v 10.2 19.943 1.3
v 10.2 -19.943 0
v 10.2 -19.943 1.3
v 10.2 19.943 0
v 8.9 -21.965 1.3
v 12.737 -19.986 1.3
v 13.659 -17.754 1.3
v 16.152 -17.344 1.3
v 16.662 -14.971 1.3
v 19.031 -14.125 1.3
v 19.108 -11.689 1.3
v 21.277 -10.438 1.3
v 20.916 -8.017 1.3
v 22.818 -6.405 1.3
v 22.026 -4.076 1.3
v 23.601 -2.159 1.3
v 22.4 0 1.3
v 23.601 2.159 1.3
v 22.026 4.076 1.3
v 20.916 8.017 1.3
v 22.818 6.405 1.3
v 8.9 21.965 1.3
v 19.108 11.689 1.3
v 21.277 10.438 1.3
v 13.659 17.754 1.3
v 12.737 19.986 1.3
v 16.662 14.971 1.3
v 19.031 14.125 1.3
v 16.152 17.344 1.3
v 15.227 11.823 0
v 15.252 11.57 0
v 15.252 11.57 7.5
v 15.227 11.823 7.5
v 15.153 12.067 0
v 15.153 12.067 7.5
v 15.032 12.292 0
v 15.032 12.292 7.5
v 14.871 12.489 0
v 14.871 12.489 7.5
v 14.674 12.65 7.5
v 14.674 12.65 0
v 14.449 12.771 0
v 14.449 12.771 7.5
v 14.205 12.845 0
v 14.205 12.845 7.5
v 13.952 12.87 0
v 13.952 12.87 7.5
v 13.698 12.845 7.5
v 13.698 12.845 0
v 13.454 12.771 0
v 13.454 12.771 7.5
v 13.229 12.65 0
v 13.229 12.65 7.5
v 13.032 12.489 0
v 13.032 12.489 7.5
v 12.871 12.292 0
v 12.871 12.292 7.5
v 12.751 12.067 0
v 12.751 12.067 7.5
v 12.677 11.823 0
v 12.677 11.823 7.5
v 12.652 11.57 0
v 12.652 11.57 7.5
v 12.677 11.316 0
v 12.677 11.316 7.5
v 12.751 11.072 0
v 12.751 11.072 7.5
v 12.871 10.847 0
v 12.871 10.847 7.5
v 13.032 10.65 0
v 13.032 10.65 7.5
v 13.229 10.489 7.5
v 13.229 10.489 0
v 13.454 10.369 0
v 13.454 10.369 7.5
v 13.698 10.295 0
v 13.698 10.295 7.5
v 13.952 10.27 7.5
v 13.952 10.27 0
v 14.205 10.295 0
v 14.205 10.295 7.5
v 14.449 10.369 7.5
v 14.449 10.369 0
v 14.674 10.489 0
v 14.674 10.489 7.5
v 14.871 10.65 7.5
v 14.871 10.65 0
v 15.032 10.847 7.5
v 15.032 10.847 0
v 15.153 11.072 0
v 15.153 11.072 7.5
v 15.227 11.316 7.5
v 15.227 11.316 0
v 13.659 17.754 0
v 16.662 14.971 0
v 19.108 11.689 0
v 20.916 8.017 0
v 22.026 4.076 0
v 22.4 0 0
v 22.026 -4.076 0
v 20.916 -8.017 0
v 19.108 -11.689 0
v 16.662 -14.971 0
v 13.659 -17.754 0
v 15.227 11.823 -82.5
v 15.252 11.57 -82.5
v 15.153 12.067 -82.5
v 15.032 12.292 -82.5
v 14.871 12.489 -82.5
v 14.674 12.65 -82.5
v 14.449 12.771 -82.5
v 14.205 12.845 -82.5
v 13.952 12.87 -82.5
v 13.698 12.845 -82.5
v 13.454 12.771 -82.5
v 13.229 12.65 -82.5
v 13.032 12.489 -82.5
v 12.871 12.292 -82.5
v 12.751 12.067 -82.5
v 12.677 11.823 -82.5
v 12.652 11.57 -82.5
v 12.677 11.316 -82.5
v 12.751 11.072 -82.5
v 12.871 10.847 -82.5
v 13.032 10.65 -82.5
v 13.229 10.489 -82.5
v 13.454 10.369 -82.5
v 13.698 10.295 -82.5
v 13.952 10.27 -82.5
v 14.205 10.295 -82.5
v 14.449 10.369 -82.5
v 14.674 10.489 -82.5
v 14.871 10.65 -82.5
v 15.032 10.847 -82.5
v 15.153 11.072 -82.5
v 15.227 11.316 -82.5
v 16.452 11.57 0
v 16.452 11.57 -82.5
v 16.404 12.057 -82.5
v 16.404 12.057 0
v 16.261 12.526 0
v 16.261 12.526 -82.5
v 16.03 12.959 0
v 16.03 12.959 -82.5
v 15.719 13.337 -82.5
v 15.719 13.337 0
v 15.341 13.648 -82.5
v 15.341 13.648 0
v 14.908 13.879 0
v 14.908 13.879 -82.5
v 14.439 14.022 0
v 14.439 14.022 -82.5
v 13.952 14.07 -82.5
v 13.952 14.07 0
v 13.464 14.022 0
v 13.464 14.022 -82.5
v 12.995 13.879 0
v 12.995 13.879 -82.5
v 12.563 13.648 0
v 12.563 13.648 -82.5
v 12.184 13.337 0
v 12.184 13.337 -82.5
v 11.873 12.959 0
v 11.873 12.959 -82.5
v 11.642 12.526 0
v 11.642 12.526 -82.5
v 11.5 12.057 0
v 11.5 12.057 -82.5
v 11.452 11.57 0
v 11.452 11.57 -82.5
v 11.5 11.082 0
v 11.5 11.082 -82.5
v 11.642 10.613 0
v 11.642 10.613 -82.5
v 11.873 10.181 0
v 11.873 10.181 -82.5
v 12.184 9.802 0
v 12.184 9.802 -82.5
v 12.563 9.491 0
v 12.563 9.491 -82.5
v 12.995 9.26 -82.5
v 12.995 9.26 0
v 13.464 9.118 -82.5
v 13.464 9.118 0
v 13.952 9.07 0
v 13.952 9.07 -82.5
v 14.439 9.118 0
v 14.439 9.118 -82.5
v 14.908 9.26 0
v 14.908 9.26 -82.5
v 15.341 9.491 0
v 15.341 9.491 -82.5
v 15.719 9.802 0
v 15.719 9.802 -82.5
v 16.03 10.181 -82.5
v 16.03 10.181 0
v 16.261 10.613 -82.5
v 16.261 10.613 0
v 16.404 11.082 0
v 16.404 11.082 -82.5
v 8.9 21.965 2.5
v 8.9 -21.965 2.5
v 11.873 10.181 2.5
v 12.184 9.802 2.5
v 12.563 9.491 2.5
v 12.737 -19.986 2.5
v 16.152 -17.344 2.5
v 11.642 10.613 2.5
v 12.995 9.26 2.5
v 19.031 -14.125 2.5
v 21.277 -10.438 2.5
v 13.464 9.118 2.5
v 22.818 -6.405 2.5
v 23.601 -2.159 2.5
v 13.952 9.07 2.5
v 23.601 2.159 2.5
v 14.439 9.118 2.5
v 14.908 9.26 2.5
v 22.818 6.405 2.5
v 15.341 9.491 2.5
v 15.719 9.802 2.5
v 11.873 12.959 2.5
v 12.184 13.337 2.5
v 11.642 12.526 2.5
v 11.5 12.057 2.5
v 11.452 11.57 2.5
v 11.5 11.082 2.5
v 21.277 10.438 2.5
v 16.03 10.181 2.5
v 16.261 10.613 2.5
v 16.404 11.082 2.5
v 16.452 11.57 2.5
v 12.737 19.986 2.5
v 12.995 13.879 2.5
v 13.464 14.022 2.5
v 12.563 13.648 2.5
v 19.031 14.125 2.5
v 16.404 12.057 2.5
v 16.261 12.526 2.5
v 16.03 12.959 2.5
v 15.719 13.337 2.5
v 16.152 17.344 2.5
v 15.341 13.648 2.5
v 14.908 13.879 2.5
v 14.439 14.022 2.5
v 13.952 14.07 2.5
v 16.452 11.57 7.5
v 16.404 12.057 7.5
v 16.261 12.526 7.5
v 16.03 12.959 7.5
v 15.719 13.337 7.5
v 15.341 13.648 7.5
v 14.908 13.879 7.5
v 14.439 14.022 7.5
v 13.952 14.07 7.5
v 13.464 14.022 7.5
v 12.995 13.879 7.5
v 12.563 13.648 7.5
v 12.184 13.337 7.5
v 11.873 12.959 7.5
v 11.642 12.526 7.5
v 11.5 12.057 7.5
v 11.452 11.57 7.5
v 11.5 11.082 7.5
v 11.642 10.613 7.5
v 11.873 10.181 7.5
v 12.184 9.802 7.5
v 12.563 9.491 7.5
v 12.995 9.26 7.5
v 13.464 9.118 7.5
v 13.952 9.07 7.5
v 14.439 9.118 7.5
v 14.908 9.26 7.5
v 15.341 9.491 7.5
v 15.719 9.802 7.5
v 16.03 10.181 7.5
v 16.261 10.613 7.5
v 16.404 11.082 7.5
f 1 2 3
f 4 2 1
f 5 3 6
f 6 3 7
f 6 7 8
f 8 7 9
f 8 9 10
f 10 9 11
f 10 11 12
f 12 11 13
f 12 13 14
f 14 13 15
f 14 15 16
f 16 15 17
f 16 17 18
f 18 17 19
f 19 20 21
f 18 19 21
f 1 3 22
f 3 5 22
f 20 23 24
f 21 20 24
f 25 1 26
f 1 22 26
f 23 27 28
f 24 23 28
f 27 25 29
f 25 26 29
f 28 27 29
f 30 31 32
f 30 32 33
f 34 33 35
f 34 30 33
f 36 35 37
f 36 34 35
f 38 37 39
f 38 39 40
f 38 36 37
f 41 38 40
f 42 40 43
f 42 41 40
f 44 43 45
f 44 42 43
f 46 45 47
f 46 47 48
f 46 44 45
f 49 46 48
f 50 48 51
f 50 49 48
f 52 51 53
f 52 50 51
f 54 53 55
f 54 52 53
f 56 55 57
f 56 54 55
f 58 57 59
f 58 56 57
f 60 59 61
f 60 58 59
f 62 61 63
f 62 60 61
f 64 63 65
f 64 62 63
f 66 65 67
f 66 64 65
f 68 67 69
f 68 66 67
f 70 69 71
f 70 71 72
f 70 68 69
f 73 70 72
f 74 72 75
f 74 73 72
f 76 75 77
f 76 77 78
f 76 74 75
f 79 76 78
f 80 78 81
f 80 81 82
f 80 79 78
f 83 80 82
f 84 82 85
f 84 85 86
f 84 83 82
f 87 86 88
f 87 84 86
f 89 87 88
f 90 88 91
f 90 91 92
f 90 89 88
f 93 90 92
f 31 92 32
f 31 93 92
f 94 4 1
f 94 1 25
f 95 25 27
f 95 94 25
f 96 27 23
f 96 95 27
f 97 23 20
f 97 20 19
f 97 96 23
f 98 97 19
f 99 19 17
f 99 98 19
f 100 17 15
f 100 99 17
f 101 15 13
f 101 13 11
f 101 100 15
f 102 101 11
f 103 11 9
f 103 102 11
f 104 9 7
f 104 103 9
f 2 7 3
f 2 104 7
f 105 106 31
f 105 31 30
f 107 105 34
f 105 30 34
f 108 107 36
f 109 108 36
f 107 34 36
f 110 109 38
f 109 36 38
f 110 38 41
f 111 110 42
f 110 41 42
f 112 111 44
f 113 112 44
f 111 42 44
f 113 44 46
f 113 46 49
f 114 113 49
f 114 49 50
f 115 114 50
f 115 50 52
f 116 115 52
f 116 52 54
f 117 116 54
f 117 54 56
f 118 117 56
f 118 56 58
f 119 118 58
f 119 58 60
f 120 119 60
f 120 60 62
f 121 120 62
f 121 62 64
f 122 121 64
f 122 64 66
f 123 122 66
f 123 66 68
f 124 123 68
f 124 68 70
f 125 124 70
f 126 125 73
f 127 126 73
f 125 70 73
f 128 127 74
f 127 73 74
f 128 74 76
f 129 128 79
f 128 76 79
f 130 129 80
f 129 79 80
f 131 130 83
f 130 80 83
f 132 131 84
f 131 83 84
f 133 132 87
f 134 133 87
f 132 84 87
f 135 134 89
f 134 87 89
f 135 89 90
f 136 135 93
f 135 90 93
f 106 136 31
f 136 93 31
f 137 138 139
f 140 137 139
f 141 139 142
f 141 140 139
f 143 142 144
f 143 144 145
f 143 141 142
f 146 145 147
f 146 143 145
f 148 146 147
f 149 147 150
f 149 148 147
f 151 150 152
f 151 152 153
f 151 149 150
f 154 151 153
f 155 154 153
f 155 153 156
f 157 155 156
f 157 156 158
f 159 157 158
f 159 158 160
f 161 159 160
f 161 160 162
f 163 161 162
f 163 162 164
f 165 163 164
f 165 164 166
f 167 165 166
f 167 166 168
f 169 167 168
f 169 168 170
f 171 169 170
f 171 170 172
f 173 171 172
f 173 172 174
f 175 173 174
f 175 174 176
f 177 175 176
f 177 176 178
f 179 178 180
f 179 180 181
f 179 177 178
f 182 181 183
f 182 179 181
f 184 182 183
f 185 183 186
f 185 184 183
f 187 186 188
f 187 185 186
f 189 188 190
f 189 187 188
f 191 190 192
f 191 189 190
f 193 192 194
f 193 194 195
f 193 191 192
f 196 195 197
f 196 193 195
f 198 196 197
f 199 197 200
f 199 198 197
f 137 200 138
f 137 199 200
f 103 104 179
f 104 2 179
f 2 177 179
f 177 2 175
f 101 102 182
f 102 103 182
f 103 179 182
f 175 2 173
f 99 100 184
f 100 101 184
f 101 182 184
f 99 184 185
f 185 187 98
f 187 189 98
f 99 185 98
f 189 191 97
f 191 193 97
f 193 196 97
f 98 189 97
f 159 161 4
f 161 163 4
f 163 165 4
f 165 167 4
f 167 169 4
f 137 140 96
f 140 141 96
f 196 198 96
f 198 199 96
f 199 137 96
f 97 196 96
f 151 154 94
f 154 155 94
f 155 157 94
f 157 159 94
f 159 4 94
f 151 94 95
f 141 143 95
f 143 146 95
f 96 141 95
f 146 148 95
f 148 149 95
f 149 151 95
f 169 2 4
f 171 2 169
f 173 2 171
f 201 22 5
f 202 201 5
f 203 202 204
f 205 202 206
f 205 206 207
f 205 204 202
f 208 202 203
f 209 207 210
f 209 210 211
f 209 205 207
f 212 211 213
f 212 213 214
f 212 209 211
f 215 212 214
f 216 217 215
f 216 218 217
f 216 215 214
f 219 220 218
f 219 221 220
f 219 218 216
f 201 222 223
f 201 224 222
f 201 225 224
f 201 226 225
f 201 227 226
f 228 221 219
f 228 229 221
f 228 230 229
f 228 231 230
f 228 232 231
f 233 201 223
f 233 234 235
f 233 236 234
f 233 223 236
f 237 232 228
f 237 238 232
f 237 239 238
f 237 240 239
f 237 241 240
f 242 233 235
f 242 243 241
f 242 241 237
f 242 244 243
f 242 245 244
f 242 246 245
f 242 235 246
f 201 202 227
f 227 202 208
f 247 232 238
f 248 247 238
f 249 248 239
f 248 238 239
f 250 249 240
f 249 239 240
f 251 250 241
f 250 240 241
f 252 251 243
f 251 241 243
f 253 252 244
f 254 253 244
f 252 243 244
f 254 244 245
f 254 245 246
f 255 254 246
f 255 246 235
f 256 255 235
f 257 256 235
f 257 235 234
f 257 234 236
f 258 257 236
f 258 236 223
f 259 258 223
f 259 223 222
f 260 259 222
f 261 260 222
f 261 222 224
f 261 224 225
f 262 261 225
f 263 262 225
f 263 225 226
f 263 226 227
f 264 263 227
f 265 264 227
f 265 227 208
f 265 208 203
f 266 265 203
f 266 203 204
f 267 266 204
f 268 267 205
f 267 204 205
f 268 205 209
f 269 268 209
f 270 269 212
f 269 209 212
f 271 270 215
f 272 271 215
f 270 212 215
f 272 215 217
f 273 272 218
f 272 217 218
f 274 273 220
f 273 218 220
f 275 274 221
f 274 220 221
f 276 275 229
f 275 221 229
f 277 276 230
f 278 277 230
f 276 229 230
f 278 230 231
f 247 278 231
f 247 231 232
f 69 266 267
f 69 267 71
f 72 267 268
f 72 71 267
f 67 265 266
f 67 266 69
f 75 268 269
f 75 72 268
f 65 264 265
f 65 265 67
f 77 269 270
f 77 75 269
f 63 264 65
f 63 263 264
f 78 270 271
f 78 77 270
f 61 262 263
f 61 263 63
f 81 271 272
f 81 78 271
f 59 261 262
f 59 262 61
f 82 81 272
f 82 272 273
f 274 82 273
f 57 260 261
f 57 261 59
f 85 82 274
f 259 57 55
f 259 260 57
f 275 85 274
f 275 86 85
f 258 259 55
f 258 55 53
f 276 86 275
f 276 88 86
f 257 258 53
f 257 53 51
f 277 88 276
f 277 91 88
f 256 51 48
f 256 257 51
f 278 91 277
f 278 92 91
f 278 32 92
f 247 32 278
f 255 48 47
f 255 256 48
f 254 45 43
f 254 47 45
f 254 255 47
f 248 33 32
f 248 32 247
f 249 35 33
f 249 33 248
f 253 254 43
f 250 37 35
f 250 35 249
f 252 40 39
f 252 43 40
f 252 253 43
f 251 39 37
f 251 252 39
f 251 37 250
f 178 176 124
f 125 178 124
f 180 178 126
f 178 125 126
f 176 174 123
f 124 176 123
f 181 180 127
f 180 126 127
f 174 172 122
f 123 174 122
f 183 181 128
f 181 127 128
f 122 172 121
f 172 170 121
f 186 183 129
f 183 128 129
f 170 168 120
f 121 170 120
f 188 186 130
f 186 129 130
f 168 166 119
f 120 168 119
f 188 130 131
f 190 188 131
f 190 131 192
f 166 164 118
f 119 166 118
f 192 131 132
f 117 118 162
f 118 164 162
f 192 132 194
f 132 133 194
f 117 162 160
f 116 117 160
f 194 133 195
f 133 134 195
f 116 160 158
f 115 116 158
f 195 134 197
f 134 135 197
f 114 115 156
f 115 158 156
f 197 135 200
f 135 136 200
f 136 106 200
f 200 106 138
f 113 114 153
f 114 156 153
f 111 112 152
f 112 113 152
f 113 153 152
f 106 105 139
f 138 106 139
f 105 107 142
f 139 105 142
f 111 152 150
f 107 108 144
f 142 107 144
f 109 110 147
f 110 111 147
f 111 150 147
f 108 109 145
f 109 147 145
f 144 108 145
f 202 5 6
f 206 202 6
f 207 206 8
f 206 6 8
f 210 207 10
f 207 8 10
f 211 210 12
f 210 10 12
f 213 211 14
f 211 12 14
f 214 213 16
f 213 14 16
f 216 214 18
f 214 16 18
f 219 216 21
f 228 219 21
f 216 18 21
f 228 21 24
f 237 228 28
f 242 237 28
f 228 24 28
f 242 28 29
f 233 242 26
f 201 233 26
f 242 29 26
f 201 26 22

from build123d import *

# Parameters (mm, degrees)
F0_R     = 2.5
F1_DEPTH = 2.5
F0_R_2   = 1.3
F2_DEPTH = 7.5
F3_DEPTH = 90
F4_DEPTH = 1.3


with BuildPart() as f1:
    # F0 (on Top) → F1 (new body)
    with BuildSketch(Plane.XY):
        with BuildLine():
            Line((8.9, 21.9654273803), (8.9, -21.9654273803))
            ThreePointArc((8.9, -21.9654273803), (23.7, 0), (8.9, 21.9654273803))
        make_face()
        with BuildLine():
            ThreePointArc((10.2, 19.9429185427), (22.4, 0), (10.2, -19.9429185427))
            Line((10.2, -19.9429185427), (10.2, 19.9429185427))
        make_face(mode=Mode.SUBTRACT)
        with BuildLine():
            Line((10.2, 19.9429185427), (10.2, -19.9429185427))
            ThreePointArc((10.2, -19.9429185427), (22.4, 0), (10.2, 19.9429185427))
        make_face()
        with Locations((13.9515874907, 11.5695847198)):
            Circle(F0_R, mode=Mode.SUBTRACT)
    extrude(amount=F1_DEPTH)

    # F0 (on Top) → F2 (join)
    with BuildSketch(Plane.XY):
        with Locations((13.9515874907, 11.5695847198)):
            Circle(F0_R)
        with Locations((13.9515874907, 11.5695847198)):
            Circle(F0_R_2, mode=Mode.SUBTRACT)
    extrude(amount=F2_DEPTH)

    # F3 (add): a face of the model
    f3_faces = [f1.faces().sort_by_distance(p)[0] for p in [
        (11.5222981689, 11.5695847198, 7.5),
    ]]
    extrude(f3_faces, amount=-F3_DEPTH)

    # F0 (on Top) → F4 (cut)
    with BuildSketch(Plane.XY):
        with BuildLine():
            Line((8.9, 21.9654273803), (8.9, -21.9654273803))
            ThreePointArc((8.9, -21.9654273803), (23.7, 0), (8.9, 21.9654273803))
        make_face()
        with BuildLine():
            ThreePointArc((10.2, 19.9429185427), (22.4, 0), (10.2, -19.9429185427))
            Line((10.2, -19.9429185427), (10.2, 19.9429185427))
        make_face(mode=Mode.SUBTRACT)
    extrude(amount=F4_DEPTH, mode=Mode.SUBTRACT)


solid = f1.part
